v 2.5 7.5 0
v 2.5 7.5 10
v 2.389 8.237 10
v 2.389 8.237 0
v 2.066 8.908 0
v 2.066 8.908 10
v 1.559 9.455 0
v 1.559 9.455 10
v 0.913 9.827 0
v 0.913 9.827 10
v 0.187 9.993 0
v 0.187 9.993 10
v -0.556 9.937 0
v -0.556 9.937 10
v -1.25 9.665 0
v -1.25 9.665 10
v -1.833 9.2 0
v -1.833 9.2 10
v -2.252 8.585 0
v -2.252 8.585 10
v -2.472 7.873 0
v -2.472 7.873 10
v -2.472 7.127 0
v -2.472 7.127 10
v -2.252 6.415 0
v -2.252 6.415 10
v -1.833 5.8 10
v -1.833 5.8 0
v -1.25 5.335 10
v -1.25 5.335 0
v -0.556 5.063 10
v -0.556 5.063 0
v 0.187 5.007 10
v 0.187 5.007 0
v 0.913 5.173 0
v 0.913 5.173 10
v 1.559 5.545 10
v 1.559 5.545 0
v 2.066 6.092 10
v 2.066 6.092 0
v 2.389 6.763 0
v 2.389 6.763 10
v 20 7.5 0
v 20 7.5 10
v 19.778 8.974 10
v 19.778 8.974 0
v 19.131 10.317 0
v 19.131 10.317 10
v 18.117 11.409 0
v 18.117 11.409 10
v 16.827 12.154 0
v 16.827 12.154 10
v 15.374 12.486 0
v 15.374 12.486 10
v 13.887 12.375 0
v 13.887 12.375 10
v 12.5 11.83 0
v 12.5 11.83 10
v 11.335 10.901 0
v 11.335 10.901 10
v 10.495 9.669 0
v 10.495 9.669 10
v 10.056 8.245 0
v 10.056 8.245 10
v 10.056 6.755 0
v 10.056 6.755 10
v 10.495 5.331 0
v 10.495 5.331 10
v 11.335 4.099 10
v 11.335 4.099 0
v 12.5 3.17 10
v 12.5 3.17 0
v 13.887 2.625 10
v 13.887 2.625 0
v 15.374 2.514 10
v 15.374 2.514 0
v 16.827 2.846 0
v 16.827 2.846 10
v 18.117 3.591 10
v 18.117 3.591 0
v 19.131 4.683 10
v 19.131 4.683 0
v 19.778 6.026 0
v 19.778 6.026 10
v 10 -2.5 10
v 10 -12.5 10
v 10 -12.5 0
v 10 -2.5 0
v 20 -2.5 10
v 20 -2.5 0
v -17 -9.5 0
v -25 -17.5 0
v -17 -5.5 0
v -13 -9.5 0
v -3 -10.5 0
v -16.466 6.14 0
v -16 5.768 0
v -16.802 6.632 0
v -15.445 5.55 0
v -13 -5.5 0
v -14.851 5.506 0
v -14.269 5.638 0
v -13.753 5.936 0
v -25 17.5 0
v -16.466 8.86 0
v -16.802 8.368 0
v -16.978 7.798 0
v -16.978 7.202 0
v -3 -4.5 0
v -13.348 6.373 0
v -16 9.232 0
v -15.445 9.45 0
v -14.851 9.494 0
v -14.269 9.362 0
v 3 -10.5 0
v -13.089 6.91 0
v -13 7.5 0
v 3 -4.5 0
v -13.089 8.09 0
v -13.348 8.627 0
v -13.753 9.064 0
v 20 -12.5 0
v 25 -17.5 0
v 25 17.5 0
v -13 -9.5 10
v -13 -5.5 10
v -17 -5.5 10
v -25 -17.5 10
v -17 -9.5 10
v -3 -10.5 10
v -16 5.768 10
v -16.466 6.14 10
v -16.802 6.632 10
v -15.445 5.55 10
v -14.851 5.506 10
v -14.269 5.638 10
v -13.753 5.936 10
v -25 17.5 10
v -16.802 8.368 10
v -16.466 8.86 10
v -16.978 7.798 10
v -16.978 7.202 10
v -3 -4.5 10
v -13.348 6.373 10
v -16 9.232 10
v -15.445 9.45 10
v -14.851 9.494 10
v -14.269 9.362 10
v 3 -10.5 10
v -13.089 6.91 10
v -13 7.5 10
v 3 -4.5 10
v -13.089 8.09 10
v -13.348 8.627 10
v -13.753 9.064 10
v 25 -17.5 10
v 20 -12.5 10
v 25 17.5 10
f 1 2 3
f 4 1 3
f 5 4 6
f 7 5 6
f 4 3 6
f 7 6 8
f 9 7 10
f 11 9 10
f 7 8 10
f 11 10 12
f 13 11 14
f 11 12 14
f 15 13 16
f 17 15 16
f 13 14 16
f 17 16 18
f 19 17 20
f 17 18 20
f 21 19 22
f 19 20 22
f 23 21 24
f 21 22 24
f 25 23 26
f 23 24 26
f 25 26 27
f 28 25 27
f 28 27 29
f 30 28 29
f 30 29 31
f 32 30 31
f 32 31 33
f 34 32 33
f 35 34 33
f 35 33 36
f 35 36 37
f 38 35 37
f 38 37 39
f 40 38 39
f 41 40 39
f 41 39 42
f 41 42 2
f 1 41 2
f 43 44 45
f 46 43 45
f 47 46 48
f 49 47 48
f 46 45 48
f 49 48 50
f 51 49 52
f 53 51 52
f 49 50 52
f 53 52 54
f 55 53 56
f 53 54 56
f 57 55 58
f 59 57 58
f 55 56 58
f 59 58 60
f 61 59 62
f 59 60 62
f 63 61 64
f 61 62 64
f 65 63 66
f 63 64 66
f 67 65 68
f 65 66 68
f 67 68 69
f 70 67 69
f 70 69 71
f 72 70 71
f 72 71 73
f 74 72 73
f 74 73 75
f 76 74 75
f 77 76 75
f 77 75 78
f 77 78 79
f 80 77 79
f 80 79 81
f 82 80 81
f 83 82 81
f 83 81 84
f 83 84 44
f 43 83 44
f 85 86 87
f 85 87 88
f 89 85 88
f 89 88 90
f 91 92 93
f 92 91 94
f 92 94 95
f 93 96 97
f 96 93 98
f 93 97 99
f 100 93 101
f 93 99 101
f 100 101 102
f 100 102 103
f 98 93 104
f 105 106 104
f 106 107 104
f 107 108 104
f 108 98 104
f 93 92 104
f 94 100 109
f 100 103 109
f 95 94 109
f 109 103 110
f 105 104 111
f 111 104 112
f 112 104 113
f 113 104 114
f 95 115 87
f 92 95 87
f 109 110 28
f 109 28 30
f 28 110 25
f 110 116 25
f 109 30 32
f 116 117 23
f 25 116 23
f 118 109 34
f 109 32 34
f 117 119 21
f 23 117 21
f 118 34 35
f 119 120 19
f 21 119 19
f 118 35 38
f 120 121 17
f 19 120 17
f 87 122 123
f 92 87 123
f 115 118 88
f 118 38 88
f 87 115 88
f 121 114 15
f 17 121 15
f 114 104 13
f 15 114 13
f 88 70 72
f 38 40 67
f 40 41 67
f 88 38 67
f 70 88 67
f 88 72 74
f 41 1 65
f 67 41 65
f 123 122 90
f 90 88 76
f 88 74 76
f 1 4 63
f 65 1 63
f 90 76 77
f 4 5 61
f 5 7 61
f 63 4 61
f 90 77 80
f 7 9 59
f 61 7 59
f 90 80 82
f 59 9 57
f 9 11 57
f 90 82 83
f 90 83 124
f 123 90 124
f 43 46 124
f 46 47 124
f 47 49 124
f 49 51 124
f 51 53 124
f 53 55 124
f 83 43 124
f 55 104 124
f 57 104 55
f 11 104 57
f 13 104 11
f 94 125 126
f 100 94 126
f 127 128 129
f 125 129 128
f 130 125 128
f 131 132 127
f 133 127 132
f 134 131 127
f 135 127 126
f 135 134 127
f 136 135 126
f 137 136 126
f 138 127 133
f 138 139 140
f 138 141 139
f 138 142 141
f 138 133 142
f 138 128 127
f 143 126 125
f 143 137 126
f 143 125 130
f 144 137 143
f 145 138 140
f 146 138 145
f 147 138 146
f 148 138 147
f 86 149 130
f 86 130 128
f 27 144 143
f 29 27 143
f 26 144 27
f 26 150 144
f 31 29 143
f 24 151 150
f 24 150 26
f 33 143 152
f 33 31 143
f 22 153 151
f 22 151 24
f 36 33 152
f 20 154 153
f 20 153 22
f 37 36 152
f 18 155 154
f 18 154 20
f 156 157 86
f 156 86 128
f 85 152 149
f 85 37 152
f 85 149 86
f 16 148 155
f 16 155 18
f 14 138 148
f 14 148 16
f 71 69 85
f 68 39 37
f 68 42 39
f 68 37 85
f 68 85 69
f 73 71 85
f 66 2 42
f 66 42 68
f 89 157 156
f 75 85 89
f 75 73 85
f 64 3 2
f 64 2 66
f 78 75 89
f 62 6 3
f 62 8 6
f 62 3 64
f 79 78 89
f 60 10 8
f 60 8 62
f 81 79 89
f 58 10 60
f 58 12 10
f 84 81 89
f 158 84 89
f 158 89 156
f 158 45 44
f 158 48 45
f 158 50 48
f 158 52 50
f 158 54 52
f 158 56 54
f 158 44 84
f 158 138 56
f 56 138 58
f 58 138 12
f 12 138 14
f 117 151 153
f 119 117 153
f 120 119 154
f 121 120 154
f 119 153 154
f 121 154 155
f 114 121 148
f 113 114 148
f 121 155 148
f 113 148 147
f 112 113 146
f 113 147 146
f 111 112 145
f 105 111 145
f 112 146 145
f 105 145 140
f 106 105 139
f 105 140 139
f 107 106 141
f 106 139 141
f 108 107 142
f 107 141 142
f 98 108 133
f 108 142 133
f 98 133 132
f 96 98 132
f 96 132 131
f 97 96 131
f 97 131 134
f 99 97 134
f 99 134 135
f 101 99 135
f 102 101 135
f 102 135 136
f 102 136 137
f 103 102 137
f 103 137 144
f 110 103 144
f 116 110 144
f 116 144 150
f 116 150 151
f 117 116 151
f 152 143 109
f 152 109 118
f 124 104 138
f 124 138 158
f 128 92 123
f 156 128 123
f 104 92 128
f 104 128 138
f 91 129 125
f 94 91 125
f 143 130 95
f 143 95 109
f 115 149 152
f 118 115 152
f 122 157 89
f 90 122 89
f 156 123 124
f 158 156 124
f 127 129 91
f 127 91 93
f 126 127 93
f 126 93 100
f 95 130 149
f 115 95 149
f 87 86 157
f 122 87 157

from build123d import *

# Parameters (mm, degrees)
SKETCH_W      = 50
SKETCH_H      = 35
PAD_DEPTH     = 10
SKETCH001_R   = 2
SKETCH001_R_2 = 2.5
SKETCH001_R_3 = 5
SKETCH001_W   = 4
SKETCH001_H   = 4
SKETCH001_W_2 = 6
SKETCH001_H_2 = 6
SKETCH001_W_3 = 10
SKETCH001_H_3 = 10
POCKET_DEPTH  = 10.001


with BuildPart() as part:
    # Sketch → Pad (new body)
    with BuildSketch(Plane.XY):
        Rectangle(SKETCH_W, SKETCH_H)
    extrude(amount=PAD_DEPTH)

    # Sketch001 (on Face6 of Pad) → Pocket (cut, through all)
    with BuildSketch(Plane.XY.offset(10)):
        with Locations((-15, 7.5)):
            Circle(SKETCH001_R)
        with Locations((0, 7.5)):
            Circle(SKETCH001_R_2)
        with Locations((15, 7.5)):
            Circle(SKETCH001_R_3)
        with Locations((-15, -7.5)):
            Rectangle(SKETCH001_W, SKETCH001_H)
        with Locations((0, -7.5)):
            Rectangle(SKETCH001_W_2, SKETCH001_H_2)
        with Locations((15, -7.5)):
            Rectangle(SKETCH001_W_3, SKETCH001_H_3)
    extrude(amount=-POCKET_DEPTH, mode=Mode.SUBTRACT)


solid = part.part
